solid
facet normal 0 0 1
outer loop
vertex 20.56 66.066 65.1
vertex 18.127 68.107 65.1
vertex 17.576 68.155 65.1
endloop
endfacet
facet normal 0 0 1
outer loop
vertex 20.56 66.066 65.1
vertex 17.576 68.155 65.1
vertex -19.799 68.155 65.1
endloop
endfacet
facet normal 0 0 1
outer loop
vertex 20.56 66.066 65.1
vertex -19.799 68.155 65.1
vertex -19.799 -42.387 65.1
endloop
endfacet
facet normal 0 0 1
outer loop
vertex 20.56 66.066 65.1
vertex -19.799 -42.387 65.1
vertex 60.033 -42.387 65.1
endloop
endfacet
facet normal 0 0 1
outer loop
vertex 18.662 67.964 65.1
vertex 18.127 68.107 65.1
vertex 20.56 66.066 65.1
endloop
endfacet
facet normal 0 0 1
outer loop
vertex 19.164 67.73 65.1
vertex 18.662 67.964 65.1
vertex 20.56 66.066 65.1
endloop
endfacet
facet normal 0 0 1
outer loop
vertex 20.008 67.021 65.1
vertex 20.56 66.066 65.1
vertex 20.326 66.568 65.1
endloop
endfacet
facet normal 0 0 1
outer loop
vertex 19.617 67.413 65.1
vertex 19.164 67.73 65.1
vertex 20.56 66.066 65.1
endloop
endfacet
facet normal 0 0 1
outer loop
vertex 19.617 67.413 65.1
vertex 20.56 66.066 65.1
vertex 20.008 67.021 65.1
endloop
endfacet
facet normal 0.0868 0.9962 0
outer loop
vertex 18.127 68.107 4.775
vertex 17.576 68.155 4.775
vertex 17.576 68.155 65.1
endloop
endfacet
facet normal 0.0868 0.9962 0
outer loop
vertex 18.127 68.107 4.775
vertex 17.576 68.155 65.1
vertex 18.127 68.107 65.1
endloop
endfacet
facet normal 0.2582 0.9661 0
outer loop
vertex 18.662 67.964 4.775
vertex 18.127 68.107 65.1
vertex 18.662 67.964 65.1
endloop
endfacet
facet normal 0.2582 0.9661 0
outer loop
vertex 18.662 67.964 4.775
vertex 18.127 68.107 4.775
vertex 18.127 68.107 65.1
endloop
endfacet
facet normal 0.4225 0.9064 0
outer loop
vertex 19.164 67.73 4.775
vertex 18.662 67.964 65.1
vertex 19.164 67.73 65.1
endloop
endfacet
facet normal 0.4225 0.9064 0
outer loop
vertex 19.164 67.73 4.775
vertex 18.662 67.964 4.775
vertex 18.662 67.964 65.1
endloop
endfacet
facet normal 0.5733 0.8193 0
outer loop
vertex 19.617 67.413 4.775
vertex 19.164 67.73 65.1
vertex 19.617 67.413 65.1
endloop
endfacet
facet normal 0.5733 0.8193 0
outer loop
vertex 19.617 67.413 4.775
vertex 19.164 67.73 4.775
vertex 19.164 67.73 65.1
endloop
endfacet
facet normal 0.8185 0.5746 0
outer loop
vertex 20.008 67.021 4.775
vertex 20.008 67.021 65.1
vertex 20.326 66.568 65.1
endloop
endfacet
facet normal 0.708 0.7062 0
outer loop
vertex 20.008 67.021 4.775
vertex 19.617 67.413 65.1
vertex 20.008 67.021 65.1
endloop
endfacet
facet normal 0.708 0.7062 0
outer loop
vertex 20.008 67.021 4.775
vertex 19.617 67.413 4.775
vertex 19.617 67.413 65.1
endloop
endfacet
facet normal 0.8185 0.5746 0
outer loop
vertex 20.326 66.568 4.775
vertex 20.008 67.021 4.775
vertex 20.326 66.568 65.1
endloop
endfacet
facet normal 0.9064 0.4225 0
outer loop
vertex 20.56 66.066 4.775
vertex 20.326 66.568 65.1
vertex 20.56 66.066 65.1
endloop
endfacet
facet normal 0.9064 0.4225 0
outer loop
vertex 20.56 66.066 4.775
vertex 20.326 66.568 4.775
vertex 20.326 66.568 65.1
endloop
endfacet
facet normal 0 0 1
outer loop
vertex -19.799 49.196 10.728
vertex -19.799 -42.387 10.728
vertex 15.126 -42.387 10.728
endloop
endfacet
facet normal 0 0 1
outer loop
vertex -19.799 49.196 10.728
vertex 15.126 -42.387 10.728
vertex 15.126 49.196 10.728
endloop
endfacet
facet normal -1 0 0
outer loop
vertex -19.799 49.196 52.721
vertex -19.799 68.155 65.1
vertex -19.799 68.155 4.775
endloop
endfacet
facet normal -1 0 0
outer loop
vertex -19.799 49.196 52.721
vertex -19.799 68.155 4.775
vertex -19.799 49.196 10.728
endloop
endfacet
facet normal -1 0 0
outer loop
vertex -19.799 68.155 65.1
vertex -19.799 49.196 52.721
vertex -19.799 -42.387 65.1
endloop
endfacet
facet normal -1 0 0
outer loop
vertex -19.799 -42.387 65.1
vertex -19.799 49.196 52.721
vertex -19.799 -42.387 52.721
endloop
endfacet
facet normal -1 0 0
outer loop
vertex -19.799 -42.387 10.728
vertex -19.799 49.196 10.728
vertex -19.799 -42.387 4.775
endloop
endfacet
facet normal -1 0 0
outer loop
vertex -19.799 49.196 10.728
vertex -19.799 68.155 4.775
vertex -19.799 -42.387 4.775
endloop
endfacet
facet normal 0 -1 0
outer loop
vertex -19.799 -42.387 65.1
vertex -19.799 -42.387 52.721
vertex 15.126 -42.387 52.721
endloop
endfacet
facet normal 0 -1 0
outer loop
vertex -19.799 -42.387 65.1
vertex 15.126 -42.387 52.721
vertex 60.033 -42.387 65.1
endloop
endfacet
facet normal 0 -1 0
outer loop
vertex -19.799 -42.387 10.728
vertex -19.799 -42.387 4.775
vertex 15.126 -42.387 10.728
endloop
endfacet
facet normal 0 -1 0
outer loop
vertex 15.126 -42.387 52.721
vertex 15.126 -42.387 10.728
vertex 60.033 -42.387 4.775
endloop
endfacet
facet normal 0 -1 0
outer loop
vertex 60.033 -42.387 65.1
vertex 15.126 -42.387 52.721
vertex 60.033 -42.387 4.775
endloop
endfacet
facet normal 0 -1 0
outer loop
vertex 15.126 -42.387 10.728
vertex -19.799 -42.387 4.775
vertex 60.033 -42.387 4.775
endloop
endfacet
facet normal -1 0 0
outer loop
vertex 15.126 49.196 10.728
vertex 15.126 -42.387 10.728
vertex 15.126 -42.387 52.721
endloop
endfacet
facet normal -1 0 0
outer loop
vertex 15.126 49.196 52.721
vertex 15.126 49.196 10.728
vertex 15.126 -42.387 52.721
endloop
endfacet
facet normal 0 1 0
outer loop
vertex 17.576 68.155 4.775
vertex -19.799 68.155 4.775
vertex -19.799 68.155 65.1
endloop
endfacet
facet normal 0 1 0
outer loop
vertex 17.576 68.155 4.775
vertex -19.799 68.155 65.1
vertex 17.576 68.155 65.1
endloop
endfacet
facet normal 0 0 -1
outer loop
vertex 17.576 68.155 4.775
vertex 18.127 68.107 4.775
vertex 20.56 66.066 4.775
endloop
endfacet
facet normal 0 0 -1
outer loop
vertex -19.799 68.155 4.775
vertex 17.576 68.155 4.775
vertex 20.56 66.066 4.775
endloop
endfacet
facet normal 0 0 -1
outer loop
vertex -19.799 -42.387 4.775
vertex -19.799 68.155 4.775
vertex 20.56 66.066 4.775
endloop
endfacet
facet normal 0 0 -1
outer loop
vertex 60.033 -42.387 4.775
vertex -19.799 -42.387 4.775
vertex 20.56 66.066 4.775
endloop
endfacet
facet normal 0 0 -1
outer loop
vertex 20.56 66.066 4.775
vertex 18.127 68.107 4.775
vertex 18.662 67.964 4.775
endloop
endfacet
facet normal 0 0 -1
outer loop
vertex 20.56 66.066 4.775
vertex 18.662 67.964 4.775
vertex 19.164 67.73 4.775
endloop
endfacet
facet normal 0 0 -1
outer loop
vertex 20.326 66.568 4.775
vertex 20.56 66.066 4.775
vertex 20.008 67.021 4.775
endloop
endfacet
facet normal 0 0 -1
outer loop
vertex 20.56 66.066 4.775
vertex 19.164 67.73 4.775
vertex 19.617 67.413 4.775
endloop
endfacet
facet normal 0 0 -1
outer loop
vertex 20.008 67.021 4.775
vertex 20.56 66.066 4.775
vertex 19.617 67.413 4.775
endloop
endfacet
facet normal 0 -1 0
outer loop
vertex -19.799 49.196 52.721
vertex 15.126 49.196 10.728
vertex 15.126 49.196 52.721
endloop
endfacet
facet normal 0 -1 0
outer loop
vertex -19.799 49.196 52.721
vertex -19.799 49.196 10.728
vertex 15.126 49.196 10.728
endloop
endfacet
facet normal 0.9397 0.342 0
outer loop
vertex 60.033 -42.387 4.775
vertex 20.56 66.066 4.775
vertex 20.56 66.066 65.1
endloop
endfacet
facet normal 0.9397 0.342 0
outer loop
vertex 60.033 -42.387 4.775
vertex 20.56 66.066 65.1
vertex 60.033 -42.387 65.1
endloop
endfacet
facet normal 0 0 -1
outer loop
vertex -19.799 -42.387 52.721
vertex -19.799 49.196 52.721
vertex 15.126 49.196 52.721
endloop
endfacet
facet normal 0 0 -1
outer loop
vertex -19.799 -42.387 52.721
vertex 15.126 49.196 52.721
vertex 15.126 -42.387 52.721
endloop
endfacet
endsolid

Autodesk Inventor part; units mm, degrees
ref_plane "YZ Plane" through (0, 0, 0) normal (1, 0, 0) x (0, 1, 0)
ref_plane "XZ Plane" through (0, 0, 0) normal (0, 1, 0) x (-1, 0, 0)
ref_plane "XY Plane" through (0, 0, 0) normal (0, 0, 1) x (1, 0, 0)
sketch "Sketch1" plane through (0, 0, 0) normal (0, 0, 1) x (1, 0, 0)
  line L0 (-19.7993, 68.1553) -> (17.5761, 68.1553)
  line L1 (20.5597, 66.0662) -> (62.3445, -48.7367)
  line L2 (-19.7993, 68.1553) -> (-19.7993, -48.7367)
  line L3 (-19.7993, -48.7367) -> (62.3445, -48.7367)
  arc A0 (20.5597, 66.0662) -> (17.5761, 68.1553) centre (17.5761, 64.9803) ccw
  point P0 (0, 0)
  point P1 (19.7993, 68.1553)
  dimension "d0" = 110
  dimension "d1" = 39.5986
  dimension "d2" = 3.175
  dimension "d3" = 122.1707
extrude "Extrusion1" add sketch "Sketch1" along normal blind 63.5
sketch "Sketch2" plane through (-19.7993, -48.7367, 0) normal (-1, 0, 0) x (0, 0, 1)
  line L0 (10.7282, 97.9332) -> (52.7214, 97.9332)
  line L1 (52.7214, 97.9332) -> (52.7214, 3.0652)
  line L2 (52.7214, 3.0652) -> (10.7282, 3.0652)
  line L3 (10.7282, 3.0652) -> (10.7282, 97.9332)
  point P0 (0, 48.7367)
extrude "Extrusion2" cut sketch "Sketch2" against normal blind 34.925
move faces "Move1" translate (0, 0, -6.35) faces at (21.035, -10.4691, 63.5)
move faces "Move2" translate (0, 0, 4.7752) faces at (21.035, -10.4691, 0)
move faces "Move3" translate (0, 6.35, 0) faces at (7.582, -48.7367, 22.2335)
move faces "Move4" translate (0, 0, 7.9502) faces at (20.2646, -6.2358, 57.15)
